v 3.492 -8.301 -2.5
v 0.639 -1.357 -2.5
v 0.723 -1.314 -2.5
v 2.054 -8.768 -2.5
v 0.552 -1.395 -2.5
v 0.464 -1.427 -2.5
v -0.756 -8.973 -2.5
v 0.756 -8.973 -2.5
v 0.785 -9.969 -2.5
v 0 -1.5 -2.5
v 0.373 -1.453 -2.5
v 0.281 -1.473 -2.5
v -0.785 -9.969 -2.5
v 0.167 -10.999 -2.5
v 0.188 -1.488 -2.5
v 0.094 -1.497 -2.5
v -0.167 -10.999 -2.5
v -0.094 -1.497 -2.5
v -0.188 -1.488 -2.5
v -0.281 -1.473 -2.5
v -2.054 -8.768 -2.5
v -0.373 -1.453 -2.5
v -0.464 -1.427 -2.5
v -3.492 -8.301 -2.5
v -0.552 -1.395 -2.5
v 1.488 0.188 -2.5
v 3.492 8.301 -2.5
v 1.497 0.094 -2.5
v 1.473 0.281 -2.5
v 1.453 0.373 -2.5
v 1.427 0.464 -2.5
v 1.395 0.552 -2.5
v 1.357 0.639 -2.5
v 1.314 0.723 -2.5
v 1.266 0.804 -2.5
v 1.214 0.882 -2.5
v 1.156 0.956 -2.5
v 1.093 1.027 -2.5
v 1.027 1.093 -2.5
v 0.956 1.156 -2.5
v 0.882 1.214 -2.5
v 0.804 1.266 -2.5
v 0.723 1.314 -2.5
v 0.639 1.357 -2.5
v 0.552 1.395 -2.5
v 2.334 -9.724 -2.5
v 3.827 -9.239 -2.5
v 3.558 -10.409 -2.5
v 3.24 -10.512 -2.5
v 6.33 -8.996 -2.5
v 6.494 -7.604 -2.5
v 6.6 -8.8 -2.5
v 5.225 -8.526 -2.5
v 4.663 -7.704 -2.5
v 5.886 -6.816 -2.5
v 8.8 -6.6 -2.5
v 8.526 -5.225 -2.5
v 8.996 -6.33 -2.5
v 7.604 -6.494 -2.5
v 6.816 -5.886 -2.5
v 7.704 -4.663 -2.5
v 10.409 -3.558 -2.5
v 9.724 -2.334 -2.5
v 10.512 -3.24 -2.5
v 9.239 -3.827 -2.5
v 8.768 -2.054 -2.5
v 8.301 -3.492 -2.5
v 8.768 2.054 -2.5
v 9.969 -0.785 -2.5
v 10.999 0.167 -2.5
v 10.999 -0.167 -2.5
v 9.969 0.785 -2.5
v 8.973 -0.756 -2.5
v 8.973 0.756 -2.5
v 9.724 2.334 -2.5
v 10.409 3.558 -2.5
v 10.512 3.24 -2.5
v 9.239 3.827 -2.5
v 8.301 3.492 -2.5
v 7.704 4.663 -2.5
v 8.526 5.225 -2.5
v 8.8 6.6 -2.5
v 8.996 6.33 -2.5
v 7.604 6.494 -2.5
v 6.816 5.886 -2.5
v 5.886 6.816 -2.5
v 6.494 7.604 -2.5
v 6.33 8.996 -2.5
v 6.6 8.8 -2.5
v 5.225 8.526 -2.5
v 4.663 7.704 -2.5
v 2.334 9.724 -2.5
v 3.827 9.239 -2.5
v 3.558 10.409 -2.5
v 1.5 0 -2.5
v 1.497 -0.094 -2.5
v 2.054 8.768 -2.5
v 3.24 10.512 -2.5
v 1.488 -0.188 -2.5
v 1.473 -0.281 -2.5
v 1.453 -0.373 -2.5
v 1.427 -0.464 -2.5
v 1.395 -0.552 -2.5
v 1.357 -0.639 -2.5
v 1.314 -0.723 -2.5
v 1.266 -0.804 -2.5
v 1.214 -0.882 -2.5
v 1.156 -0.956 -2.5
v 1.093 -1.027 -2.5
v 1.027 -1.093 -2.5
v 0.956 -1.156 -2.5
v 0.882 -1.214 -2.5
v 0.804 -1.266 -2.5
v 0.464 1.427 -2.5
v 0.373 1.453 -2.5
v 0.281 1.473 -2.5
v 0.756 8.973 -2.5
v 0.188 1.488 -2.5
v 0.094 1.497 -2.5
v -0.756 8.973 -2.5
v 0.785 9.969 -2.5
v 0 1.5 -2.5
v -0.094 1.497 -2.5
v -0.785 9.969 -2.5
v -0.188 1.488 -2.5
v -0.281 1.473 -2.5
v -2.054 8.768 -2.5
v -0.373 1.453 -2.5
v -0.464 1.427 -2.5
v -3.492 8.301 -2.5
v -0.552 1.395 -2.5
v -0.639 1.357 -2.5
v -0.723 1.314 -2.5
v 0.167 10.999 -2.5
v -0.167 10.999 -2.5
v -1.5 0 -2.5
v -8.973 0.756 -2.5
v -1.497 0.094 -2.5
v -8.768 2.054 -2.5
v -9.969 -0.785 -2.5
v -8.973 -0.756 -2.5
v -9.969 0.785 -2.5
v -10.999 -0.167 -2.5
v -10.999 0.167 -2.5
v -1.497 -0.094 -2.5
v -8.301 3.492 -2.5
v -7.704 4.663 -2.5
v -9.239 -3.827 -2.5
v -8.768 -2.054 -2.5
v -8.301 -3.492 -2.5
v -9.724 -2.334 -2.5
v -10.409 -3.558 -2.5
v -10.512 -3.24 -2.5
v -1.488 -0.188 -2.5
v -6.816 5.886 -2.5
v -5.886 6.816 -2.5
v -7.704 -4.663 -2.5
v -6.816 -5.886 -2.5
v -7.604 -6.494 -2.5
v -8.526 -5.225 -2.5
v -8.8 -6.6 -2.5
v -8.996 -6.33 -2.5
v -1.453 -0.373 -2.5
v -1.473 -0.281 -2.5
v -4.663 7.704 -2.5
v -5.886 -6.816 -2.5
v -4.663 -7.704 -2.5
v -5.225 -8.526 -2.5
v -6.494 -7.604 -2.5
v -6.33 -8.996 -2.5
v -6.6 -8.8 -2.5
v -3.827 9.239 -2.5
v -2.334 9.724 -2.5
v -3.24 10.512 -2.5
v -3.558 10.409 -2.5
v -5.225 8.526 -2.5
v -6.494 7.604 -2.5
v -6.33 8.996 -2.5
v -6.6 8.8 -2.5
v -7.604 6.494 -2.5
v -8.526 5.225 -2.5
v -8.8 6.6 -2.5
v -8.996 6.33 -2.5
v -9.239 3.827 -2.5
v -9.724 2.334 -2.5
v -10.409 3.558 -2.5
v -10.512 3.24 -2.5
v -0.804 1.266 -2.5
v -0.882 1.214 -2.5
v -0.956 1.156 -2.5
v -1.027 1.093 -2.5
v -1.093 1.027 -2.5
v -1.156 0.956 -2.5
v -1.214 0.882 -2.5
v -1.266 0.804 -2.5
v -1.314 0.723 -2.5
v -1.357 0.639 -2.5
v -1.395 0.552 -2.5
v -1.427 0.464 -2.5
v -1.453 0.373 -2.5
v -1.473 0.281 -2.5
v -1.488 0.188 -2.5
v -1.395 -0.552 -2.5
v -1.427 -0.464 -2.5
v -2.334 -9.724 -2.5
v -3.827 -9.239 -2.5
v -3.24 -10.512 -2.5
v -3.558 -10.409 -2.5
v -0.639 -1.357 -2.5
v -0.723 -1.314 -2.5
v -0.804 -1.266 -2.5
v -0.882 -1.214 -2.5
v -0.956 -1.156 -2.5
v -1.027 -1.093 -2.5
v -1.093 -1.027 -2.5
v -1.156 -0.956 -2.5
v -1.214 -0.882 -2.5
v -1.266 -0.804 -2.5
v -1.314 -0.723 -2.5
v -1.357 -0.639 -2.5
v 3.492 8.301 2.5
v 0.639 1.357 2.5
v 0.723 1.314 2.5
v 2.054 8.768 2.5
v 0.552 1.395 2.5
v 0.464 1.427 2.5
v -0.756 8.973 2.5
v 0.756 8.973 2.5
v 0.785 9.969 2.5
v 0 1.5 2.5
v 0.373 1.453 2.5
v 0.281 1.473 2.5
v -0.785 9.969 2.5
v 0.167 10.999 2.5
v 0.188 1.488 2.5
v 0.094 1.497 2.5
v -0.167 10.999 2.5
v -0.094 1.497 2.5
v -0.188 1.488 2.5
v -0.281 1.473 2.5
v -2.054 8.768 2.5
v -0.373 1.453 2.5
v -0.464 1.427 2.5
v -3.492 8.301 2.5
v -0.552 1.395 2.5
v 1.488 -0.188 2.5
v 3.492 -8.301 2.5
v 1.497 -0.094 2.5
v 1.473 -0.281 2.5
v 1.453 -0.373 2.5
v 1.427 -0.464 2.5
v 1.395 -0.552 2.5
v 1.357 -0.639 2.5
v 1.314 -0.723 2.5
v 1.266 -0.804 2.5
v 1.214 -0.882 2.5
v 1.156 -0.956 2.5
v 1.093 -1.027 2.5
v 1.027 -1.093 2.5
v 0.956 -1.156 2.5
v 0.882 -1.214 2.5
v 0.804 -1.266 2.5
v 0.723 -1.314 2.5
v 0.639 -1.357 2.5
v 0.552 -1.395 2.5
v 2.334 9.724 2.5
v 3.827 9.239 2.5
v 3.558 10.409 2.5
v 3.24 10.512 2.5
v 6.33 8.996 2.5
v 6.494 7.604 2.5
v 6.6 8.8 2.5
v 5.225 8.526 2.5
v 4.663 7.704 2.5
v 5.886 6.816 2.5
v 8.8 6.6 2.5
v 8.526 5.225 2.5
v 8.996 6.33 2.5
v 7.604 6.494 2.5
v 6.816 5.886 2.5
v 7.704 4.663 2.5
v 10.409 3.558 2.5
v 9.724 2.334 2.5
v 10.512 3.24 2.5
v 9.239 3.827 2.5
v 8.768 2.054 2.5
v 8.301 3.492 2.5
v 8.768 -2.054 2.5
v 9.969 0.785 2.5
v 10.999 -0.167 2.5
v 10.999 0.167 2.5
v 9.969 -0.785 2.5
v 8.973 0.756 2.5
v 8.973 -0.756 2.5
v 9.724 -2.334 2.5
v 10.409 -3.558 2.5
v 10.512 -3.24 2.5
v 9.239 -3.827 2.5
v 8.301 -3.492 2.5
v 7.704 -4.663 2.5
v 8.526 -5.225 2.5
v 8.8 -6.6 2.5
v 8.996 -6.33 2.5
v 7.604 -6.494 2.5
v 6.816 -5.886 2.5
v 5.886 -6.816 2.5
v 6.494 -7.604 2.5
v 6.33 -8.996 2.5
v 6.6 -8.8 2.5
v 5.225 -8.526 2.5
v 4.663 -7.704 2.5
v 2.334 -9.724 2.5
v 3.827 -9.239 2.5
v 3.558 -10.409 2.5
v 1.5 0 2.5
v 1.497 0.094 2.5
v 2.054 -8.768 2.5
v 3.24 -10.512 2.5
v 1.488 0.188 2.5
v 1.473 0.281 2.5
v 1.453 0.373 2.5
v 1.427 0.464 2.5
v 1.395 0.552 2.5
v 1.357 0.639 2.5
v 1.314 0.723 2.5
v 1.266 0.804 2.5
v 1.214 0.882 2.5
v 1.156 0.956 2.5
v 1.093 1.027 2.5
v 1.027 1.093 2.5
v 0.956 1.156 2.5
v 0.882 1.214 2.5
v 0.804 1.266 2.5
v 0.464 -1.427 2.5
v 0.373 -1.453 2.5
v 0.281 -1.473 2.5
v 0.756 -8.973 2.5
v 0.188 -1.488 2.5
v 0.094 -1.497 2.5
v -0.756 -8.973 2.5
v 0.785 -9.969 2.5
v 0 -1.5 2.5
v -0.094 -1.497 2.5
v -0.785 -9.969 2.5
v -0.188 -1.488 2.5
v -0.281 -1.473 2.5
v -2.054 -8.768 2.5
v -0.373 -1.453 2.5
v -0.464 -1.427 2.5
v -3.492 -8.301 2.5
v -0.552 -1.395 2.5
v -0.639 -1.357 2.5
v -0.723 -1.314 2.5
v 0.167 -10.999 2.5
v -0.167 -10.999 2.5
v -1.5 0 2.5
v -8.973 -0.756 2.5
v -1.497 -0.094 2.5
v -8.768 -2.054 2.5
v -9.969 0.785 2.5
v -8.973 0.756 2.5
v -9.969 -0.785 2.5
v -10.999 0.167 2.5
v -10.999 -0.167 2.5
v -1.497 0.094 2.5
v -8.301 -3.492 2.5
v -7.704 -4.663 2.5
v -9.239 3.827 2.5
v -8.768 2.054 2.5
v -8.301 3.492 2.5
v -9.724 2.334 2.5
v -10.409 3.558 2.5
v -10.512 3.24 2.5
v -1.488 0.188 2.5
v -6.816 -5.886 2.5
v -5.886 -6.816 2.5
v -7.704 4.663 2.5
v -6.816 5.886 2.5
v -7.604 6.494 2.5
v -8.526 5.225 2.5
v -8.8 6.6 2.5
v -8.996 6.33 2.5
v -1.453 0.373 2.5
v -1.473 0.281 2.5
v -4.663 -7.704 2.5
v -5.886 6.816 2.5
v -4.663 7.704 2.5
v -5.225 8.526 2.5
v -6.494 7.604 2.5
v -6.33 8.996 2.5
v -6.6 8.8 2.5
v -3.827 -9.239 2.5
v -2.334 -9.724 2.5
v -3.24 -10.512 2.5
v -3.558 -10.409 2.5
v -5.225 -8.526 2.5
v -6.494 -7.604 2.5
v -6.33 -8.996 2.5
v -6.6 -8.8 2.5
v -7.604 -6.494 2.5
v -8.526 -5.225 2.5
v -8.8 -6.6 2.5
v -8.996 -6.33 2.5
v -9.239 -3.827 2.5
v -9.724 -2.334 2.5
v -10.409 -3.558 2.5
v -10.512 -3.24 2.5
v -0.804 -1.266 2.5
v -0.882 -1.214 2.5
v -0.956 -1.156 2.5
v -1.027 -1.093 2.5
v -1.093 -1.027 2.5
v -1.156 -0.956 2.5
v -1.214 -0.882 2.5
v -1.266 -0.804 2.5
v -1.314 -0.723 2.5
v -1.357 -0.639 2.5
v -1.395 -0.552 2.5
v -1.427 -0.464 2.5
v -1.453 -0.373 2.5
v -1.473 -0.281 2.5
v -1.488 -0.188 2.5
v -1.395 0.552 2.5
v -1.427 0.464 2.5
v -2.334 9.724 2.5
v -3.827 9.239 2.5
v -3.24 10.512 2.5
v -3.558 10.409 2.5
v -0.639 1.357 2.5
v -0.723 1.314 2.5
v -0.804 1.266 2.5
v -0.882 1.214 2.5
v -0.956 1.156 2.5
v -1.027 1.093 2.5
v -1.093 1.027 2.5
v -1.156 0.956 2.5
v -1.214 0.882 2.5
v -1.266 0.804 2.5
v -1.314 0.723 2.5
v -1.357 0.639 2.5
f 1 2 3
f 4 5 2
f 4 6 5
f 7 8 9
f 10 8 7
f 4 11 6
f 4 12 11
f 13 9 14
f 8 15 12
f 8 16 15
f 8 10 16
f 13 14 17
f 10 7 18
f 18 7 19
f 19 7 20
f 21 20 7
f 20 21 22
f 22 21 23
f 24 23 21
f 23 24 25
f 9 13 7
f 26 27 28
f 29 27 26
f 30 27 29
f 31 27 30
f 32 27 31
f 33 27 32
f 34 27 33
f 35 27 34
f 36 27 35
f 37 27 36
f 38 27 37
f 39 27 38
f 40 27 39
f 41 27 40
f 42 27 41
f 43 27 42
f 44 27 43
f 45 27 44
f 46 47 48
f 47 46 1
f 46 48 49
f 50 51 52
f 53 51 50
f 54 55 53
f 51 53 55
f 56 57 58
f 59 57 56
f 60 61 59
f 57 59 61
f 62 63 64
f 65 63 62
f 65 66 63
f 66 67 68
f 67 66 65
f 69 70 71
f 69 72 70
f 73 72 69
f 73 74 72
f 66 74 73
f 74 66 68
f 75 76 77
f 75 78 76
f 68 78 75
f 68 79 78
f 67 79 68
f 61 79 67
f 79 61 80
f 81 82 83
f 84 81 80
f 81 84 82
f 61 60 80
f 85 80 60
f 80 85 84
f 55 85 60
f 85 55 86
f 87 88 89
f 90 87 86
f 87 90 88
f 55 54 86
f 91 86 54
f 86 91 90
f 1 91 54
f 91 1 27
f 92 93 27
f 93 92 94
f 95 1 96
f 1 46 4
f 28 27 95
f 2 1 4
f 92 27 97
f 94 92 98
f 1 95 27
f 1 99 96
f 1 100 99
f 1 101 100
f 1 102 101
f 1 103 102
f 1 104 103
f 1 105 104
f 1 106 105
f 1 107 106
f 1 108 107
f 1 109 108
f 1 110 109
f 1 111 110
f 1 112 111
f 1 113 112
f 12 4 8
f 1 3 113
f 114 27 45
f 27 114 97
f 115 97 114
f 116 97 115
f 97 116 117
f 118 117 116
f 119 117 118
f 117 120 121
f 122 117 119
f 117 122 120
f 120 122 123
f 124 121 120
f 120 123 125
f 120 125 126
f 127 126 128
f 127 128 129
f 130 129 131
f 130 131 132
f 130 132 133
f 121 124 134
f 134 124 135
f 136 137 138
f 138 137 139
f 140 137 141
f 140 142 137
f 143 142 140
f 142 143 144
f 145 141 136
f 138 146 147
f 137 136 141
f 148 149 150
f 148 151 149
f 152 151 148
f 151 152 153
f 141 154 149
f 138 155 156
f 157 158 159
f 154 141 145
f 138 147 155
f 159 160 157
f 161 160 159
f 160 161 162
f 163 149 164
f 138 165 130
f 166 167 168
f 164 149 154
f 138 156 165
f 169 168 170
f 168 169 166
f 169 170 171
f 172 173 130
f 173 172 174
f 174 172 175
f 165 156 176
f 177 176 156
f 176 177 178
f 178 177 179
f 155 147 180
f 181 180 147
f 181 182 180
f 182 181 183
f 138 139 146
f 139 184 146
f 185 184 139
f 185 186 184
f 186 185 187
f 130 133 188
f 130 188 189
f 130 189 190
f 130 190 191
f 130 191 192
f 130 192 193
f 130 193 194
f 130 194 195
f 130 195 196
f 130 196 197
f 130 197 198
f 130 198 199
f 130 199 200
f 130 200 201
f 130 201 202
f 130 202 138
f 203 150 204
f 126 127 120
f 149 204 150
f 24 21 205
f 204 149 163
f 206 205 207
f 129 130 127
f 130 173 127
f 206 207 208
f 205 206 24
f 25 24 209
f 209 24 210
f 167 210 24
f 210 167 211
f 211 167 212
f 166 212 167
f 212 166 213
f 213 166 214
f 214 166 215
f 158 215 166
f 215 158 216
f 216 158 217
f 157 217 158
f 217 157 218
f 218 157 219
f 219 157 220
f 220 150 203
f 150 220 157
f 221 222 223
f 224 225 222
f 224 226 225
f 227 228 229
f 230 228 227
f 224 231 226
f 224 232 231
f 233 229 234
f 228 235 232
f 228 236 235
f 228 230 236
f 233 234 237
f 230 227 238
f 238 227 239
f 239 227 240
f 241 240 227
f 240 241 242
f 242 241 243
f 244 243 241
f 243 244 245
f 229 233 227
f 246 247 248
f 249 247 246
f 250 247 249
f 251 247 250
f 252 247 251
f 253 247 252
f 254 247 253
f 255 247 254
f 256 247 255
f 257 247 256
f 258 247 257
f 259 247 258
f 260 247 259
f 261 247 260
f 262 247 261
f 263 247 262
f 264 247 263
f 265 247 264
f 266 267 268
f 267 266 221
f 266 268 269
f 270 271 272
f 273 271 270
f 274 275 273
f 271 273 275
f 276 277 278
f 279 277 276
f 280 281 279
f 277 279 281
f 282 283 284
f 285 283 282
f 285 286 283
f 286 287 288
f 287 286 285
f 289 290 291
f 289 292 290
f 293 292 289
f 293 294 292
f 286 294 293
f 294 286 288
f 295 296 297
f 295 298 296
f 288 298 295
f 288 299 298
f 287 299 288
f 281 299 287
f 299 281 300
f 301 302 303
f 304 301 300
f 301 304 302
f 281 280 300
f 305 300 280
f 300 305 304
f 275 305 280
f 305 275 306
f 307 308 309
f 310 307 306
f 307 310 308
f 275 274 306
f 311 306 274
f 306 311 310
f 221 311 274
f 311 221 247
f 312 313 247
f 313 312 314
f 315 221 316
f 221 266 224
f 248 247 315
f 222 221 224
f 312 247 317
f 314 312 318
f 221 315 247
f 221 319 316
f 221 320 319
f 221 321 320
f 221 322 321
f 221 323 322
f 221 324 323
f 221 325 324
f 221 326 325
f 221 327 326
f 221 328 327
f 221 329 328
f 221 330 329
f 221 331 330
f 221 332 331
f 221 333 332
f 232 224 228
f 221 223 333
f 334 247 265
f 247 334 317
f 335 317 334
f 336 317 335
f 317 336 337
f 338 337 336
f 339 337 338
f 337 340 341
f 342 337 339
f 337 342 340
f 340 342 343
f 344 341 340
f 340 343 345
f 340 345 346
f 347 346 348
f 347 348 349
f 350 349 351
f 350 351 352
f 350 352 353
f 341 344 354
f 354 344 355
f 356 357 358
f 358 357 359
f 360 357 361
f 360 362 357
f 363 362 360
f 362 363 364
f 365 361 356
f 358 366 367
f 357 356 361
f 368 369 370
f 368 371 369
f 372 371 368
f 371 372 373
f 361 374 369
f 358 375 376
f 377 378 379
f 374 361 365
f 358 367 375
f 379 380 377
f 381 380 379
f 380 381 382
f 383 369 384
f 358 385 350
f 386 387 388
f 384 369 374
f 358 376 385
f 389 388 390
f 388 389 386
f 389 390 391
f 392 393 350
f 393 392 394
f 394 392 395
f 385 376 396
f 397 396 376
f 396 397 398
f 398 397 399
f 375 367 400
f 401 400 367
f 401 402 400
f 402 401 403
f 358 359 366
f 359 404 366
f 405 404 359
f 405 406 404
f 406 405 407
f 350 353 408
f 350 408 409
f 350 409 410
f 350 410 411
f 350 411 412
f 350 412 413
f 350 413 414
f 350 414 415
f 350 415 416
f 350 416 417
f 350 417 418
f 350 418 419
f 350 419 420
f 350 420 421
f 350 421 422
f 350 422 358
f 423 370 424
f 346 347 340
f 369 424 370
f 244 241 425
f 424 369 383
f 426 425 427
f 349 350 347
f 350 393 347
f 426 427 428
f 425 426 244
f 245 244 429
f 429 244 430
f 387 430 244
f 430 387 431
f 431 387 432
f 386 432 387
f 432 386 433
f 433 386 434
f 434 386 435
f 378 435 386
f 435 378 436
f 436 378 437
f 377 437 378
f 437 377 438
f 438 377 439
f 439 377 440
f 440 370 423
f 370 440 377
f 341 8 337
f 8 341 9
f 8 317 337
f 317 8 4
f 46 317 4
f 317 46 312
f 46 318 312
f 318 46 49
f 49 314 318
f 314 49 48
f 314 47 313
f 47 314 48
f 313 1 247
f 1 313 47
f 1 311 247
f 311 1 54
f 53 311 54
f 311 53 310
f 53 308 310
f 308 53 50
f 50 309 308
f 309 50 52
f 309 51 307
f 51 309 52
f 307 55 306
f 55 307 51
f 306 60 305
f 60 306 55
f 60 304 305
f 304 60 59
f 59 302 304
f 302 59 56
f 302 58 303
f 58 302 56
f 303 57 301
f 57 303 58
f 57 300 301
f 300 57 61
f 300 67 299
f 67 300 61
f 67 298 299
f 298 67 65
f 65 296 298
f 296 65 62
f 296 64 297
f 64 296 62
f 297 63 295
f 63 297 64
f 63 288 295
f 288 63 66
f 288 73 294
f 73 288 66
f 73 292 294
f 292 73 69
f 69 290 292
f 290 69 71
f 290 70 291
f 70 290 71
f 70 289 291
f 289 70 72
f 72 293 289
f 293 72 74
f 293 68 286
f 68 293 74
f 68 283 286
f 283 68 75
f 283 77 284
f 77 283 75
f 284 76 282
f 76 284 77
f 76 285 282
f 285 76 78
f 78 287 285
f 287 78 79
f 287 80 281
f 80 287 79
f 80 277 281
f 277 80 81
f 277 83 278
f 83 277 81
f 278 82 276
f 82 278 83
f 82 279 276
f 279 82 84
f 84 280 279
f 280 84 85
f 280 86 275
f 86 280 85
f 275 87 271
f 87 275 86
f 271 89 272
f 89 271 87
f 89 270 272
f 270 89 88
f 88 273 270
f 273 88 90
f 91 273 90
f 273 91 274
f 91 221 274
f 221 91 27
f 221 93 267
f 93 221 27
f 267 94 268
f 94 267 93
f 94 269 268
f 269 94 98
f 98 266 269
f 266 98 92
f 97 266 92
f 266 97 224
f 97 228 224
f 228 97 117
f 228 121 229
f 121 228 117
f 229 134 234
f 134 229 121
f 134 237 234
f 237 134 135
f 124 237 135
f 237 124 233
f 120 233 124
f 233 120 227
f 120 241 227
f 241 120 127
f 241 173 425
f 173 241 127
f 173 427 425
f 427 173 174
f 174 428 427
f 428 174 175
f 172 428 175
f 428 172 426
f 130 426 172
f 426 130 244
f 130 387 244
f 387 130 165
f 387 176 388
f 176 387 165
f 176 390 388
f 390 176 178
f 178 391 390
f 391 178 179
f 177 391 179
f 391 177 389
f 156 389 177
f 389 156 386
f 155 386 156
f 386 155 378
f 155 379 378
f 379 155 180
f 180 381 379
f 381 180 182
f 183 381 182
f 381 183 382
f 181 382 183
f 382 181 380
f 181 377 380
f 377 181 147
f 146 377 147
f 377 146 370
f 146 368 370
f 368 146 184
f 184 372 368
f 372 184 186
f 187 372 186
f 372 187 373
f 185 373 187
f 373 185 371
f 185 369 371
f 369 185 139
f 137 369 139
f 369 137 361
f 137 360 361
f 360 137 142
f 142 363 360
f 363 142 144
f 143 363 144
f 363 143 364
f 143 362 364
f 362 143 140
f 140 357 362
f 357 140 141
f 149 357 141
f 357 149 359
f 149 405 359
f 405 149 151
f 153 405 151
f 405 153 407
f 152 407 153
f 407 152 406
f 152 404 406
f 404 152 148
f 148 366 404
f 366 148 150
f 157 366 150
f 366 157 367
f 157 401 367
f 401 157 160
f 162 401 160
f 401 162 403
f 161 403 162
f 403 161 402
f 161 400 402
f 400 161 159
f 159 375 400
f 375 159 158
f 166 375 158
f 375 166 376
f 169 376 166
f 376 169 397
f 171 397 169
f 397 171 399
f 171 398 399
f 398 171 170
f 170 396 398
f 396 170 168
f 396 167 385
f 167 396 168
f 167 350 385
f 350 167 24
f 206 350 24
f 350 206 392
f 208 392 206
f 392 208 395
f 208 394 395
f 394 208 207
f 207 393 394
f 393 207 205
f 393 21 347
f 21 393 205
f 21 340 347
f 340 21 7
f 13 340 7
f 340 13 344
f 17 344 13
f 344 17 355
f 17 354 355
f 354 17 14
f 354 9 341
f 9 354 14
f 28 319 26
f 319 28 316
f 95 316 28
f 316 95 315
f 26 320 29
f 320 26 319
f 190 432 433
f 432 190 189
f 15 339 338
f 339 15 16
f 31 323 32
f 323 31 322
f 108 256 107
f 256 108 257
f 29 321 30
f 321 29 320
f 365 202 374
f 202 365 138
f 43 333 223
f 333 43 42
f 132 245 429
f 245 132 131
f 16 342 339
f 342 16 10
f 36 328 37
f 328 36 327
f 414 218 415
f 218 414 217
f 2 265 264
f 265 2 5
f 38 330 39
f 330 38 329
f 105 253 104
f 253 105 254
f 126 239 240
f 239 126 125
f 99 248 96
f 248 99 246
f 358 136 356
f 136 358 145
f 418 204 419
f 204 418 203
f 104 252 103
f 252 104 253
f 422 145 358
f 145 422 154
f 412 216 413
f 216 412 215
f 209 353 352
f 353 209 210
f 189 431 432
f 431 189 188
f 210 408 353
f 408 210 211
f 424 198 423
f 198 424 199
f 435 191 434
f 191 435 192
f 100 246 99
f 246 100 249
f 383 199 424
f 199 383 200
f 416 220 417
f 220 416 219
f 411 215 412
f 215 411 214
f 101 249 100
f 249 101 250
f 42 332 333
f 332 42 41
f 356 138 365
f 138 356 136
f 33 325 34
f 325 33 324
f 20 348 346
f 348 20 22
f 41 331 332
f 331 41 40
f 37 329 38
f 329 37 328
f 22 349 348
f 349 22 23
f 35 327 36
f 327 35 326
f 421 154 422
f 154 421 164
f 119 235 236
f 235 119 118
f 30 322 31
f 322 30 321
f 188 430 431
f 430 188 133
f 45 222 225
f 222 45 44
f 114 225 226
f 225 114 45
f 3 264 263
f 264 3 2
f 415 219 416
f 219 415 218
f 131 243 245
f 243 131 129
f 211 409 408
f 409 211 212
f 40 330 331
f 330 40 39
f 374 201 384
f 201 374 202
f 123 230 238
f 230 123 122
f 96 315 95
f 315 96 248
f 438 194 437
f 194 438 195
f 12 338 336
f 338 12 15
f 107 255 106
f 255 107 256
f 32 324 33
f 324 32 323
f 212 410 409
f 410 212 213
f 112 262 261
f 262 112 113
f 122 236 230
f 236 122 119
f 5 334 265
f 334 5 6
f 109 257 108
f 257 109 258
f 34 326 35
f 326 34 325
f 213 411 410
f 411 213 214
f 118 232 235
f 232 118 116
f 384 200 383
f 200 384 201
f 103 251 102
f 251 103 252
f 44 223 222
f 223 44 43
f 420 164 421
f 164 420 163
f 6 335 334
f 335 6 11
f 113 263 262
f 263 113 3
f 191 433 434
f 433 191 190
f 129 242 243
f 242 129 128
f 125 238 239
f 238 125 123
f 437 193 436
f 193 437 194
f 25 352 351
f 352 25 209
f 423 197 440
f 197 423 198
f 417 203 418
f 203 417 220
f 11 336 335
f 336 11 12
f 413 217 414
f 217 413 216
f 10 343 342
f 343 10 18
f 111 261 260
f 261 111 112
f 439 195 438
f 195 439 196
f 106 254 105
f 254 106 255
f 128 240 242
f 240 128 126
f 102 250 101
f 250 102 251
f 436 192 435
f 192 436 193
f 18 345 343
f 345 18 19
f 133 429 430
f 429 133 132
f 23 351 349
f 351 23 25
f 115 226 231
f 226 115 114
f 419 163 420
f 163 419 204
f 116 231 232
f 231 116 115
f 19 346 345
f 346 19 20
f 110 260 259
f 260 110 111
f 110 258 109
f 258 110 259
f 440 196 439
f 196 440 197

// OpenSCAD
height = 5;
type = "Spur"; // [Spur,Cog,Double Helix, Single Helix]
teeth = 20;	//	[18:50]

hole = "Yes"; //[Yes,No]
rotate_Offset_double_Helix_only = 5; //[0:20]

holeSize = 1.5;//don't make too big or your gear will disappear
scale = 100;//this is here temperarily I would not reccomend changing!


if (type == "Spur")
{
if(hole == "Yes")
{
hole();
}
else
{
spur();
}
}
else if(type == "Cog")
{
if(hole == "Yes")
{
hole();
}
else
{
cog();
}
}
else if(type == "Double Helix")
{

if(hole == "Yes")
{
hole();
}
else
{
double_helix();
}
}
else if (type == "Single Helix")
{
if(hole == "Yes")
{
hole();
}
else
{
single_helix();
}
}


module gear(number_of_teeth,
		circular_pitch=false, diametral_pitch=false,
		pressure_angle=20, clearance = 0)
{

	//Convert diametrial pitch to our native circular pitch
	circular_pitch = (circular_pitch!=false?circular_pitch:180/diametral_pitch);

	// Pitch diameter: Diameter of pitch circle.
	pitch_diameter  =  number_of_teeth * circular_pitch / 180;
	pitch_radius = pitch_diameter/2;

	// Base Circle
	base_diameter = pitch_diameter*cos(pressure_angle);
	base_radius = base_diameter/2;

	// Diametrial pitch: Number of teeth per unit length.
	pitch_diametrial = number_of_teeth / pitch_diameter;

	// Addendum: Radial distance from pitch circle to outside circle.
	addendum = 1/pitch_diametrial;

	//Outer Circle
	outer_radius = pitch_radius+addendum;
	outer_diameter = outer_radius*2;

	// Dedendum: Radial distance from pitch circle to root diameter
	dedendum = addendum + clearance;

	// Root diameter: Diameter of bottom of tooth spaces.
	root_radius = pitch_radius-dedendum;
	root_diameter = root_radius * 2;

	half_thick_angle = 360 / (4 * number_of_teeth);

	union()
	{
		rotate(half_thick_angle) circle($fn=number_of_teeth*2, r=root_radius*1.001);

		for (i= [1:number_of_teeth])
		//for (i = [0])
		{
			rotate([0,0,i*360/number_of_teeth])
			{
				involute_gear_tooth(
					pitch_radius = pitch_radius,
					root_radius = root_radius,
					base_radius = base_radius-6,
					outer_radius = outer_radius,
					half_thick_angle = half_thick_angle);
			}
		}
	}
}


module involute_gear_tooth(
					pitch_radius,
					root_radius,
					base_radius,
					outer_radius,
					half_thick_angle
					)
{
	pitch_to_base_angle  = involute_intersect_angle( base_radius, pitch_radius );

	outer_to_base_angle = involute_intersect_angle( base_radius/2, outer_radius*1);

	base1 = 0 - pitch_to_base_angle - half_thick_angle;
	pitch1 = 0 - half_thick_angle;
	outer1 = outer_to_base_angle - pitch_to_base_angle - half_thick_angle;

	b1 = polar_to_cartesian([ base1, base_radius ]);
	p1 = polar_to_cartesian([ pitch1, pitch_radius ]);
	o1 = polar_to_cartesian([ outer1, outer_radius ]);

	b2 = polar_to_cartesian([ -base1, base_radius ]);
	p2 = polar_to_cartesian([ -pitch1, pitch_radius ]);
	o2 = polar_to_cartesian([ -outer1, outer_radius ]);

	// ( root_radius > base_radius variables )
		pitch_to_root_angle = pitch_to_base_angle - involute_intersect_angle(base_radius, root_radius );
		root1 = pitch1 - pitch_to_root_angle;
		root2 = -pitch1 + pitch_to_root_angle;
		r1_t =  polar_to_cartesian([ root1, root_radius ]);
		r2_t =  polar_to_cartesian([ -root1, root_radius ]);

	// ( else )
		r1_f =  polar_to_cartesian([ base1, root_radius ]);
		r2_f =  polar_to_cartesian([ -base1, root_radius ]);

	if (root_radius > base_radius)
	{
		//echo("true");
		polygon( points = [
			r1_t,p1,o1,o2,p2,r2_t
		], convexity = 3);
	}
	else
	{
		polygon( points = [
			r1_f, b1,p1,o1,o2,p2,b2,r2_f
		], convexity = 3);
	}

}

// Mathematical Functions
//===============

// Finds the angle of the involute about the base radius at the given distance (radius) from it's center.
//source: http://www.mathhelpforum.com/math-help/geometry/136011-circle-involute-solving-y-any-given-x.html

function involute_intersect_angle(base_radius, radius) = sqrt( pow(radius/base_radius,2) - 1);



// Polar coord [angle, radius] to cartesian coord [x,y]

function polar_to_cartesian(polar) = [
	polar[1]*cos(polar[0]),
	polar[1]*sin(polar[0])
];


// Test Cases
//===============

module test_gears()
{
	gear(number_of_teeth=51,circular_pitch=200);
	translate([0, 50])gear(number_of_teeth=17,circular_pitch=200);
	translate([-50,0]) gear(number_of_teeth=17,diametral_pitch=1);
}
module cog()
{
		gear(number_of_teeth=teeth,diametral_pitch=scale/100);

}
module single_helix()
{
	translate([50,0]);
	{
	linear_extrude(height = height, center = true, convexity = 10, twist = -45)
	 gear(number_of_teeth=teeth,diametral_pitch=scale/100);
	}
}
module double_helix()
{



linear_extrude(height = height, center = true, convexity = 10, twist = -45)
	 gear(number_of_teeth=teeth,diametral_pitch=scale/100);
	translate([0,0,height])
	rotate([0,0,rotate_Offset_double_Helix_only])
 linear_extrude(height = height, center = true, convexity = 10, twist = 45)
	 gear(number_of_teeth=teeth,diametral_pitch=scale/100);

}
module spur()
{

		translate([0,0]) linear_extrude(height = height, center = true, convexity = 10, twist = 0)
	 gear(number_of_teeth=teeth,diametral_pitch=1);


}

module demo_3d_gears()
{
	//double helical gear
	// (helics don't line up perfectly - for display purposes only ;)
	translate([50,0])
	{
	linear_extrude(height = 10, center = true, convexity = 10, twist = -45)
	 gear(number_of_teeth=17,diametral_pitch=1);
	translate([0,0,10]) linear_extrude(height = height, center = true, convexity = 10, twist = 45)
	 gear(number_of_teeth=17,diametral_pitch=1);
	}

	//spur gear
	translate([0,-50]) linear_extrude(height = height, center = true, convexity = 10, twist = 0)
	 gear(number_of_teeth=17,diametral_pitch=1);

}
module hole() {
   difference() {
if(type == "Spur")
{
translate([0,0]) linear_extrude(height = height, center = true, convexity = 10, twist = 0)
	 gear(number_of_teeth=teeth,diametral_pitch=1);
}
else if(type == "Cog")
{
gear(number_of_teeth=teeth,diametral_pitch=scale/100);
}
else if (type == "Double Helix")
{
linear_extrude(height = height, center = true, convexity = 10, twist = -45)
	 gear(number_of_teeth=teeth,diametral_pitch=scale/100);
	translate([0,0,height])
	rotate([0,0,rotate_Offset_double_Helix_only])
 linear_extrude(height = height, center = true, convexity = 10, twist = 45)
	 gear(number_of_teeth=teeth,diametral_pitch=scale/100);

}
else if (type == "Single Helix")
{
linear_extrude(height = height, center = true, convexity = 10, twist = -45)
	 gear(number_of_teeth=teeth,diametral_pitch=scale/100);
}
# rotate ([0,0,0]) cylinder (h = height*4, r=holeSize, center = true, $fn=100);
}
}




module test_involute_curve()
{
	for (i=[0,1,2,3,4,5,6,7,8,9,10,11,12,13,14,15])
	{
		translate(polar_to_cartesian([involute_intersect_angle( 0.1,i) , i ])) circle($fn=15, r=0.5);
	}
}
